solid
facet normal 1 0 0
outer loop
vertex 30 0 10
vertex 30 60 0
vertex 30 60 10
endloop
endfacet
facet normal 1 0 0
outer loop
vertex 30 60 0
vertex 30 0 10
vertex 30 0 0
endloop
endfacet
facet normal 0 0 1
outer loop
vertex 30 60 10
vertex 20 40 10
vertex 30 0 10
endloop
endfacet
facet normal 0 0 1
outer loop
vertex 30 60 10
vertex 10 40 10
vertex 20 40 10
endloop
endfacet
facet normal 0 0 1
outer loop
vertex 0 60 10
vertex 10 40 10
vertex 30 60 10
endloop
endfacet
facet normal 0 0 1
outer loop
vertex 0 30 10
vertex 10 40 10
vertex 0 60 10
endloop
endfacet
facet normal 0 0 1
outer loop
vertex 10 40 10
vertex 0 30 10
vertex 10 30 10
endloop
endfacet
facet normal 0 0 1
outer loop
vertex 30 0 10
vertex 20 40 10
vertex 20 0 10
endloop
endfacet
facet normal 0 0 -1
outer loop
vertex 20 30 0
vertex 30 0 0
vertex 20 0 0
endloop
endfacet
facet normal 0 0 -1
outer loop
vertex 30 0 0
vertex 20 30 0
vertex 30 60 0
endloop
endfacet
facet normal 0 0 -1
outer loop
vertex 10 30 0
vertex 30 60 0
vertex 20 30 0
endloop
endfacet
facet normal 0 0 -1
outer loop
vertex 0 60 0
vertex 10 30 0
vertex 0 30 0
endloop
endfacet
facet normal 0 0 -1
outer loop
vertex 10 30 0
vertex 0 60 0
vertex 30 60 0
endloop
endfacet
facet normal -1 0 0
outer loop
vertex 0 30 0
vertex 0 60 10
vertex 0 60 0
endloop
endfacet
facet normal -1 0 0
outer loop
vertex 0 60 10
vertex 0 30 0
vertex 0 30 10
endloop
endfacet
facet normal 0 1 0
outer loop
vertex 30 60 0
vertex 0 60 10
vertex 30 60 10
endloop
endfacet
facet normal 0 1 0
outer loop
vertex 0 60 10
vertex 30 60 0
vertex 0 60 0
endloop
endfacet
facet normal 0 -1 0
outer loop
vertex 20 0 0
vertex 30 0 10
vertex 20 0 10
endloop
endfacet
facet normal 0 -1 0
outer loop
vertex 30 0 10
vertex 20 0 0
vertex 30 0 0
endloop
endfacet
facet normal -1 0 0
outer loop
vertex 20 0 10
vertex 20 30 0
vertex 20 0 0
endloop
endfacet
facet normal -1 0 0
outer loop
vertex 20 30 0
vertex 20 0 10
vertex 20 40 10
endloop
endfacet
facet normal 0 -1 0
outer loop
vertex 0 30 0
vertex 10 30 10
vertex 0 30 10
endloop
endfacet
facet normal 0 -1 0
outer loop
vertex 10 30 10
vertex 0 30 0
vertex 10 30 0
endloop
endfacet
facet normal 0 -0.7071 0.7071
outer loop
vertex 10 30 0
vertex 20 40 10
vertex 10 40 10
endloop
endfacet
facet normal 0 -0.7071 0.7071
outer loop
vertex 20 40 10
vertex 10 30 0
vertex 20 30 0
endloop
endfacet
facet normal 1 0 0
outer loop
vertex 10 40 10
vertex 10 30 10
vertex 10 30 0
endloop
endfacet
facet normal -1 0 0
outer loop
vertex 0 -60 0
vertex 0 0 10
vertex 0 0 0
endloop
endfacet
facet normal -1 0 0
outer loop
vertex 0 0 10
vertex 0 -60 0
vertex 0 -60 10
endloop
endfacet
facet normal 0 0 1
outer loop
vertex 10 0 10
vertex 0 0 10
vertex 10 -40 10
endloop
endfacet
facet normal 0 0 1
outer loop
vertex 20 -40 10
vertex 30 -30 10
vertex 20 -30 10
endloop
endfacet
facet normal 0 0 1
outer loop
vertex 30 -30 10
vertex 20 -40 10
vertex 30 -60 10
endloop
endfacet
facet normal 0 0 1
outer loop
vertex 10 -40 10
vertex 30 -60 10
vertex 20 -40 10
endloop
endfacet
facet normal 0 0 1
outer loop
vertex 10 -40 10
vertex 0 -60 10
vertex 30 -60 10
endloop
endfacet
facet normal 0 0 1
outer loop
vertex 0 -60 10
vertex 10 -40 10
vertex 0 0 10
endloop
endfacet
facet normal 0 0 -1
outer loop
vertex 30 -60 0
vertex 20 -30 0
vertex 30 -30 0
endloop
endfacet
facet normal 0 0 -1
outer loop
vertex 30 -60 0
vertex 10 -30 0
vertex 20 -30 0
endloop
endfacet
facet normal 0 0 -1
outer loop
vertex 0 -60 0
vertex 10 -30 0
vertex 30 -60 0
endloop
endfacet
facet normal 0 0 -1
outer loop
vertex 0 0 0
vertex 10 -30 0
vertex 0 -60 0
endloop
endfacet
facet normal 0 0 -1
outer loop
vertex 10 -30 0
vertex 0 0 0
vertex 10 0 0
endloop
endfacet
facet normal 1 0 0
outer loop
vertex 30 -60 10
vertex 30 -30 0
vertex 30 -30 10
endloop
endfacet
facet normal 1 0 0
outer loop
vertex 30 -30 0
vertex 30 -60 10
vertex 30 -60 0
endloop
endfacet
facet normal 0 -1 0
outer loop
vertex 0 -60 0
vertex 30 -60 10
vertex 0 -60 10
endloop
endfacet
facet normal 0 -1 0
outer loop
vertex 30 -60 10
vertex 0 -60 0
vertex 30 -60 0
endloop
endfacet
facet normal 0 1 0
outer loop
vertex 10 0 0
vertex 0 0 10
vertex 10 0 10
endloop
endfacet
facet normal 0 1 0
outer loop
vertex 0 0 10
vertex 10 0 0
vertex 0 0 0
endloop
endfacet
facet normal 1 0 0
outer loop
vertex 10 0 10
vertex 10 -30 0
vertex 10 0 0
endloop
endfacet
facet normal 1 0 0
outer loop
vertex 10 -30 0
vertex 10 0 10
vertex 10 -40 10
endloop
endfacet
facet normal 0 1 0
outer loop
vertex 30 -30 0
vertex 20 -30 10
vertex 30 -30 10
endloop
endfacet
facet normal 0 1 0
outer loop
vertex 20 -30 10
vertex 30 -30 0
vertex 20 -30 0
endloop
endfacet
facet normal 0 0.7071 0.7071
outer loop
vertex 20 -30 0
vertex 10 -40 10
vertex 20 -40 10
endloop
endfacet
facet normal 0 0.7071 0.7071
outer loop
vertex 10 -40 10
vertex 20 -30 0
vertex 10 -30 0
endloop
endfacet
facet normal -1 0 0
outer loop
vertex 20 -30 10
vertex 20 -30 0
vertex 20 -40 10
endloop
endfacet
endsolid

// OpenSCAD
w = 30;
h = 60;
d = 10;
cw = 20;
ch = 30;
sh = 20;

module hinge() {
	difference() {
		cube( [w,h,d] );
	
		translate([-1,-1,-1]) cube( [cw+1,ch+1,d+2] );
	
		translate([-(w-w-cw)/2,ch,0])
		rotate(45,[1,0,0])
		cube( [w-cw,sh,d] );
	
	}
}

hinge();	
translate([w,0,0])
rotate(180,[0,0,1]) hinge();	
